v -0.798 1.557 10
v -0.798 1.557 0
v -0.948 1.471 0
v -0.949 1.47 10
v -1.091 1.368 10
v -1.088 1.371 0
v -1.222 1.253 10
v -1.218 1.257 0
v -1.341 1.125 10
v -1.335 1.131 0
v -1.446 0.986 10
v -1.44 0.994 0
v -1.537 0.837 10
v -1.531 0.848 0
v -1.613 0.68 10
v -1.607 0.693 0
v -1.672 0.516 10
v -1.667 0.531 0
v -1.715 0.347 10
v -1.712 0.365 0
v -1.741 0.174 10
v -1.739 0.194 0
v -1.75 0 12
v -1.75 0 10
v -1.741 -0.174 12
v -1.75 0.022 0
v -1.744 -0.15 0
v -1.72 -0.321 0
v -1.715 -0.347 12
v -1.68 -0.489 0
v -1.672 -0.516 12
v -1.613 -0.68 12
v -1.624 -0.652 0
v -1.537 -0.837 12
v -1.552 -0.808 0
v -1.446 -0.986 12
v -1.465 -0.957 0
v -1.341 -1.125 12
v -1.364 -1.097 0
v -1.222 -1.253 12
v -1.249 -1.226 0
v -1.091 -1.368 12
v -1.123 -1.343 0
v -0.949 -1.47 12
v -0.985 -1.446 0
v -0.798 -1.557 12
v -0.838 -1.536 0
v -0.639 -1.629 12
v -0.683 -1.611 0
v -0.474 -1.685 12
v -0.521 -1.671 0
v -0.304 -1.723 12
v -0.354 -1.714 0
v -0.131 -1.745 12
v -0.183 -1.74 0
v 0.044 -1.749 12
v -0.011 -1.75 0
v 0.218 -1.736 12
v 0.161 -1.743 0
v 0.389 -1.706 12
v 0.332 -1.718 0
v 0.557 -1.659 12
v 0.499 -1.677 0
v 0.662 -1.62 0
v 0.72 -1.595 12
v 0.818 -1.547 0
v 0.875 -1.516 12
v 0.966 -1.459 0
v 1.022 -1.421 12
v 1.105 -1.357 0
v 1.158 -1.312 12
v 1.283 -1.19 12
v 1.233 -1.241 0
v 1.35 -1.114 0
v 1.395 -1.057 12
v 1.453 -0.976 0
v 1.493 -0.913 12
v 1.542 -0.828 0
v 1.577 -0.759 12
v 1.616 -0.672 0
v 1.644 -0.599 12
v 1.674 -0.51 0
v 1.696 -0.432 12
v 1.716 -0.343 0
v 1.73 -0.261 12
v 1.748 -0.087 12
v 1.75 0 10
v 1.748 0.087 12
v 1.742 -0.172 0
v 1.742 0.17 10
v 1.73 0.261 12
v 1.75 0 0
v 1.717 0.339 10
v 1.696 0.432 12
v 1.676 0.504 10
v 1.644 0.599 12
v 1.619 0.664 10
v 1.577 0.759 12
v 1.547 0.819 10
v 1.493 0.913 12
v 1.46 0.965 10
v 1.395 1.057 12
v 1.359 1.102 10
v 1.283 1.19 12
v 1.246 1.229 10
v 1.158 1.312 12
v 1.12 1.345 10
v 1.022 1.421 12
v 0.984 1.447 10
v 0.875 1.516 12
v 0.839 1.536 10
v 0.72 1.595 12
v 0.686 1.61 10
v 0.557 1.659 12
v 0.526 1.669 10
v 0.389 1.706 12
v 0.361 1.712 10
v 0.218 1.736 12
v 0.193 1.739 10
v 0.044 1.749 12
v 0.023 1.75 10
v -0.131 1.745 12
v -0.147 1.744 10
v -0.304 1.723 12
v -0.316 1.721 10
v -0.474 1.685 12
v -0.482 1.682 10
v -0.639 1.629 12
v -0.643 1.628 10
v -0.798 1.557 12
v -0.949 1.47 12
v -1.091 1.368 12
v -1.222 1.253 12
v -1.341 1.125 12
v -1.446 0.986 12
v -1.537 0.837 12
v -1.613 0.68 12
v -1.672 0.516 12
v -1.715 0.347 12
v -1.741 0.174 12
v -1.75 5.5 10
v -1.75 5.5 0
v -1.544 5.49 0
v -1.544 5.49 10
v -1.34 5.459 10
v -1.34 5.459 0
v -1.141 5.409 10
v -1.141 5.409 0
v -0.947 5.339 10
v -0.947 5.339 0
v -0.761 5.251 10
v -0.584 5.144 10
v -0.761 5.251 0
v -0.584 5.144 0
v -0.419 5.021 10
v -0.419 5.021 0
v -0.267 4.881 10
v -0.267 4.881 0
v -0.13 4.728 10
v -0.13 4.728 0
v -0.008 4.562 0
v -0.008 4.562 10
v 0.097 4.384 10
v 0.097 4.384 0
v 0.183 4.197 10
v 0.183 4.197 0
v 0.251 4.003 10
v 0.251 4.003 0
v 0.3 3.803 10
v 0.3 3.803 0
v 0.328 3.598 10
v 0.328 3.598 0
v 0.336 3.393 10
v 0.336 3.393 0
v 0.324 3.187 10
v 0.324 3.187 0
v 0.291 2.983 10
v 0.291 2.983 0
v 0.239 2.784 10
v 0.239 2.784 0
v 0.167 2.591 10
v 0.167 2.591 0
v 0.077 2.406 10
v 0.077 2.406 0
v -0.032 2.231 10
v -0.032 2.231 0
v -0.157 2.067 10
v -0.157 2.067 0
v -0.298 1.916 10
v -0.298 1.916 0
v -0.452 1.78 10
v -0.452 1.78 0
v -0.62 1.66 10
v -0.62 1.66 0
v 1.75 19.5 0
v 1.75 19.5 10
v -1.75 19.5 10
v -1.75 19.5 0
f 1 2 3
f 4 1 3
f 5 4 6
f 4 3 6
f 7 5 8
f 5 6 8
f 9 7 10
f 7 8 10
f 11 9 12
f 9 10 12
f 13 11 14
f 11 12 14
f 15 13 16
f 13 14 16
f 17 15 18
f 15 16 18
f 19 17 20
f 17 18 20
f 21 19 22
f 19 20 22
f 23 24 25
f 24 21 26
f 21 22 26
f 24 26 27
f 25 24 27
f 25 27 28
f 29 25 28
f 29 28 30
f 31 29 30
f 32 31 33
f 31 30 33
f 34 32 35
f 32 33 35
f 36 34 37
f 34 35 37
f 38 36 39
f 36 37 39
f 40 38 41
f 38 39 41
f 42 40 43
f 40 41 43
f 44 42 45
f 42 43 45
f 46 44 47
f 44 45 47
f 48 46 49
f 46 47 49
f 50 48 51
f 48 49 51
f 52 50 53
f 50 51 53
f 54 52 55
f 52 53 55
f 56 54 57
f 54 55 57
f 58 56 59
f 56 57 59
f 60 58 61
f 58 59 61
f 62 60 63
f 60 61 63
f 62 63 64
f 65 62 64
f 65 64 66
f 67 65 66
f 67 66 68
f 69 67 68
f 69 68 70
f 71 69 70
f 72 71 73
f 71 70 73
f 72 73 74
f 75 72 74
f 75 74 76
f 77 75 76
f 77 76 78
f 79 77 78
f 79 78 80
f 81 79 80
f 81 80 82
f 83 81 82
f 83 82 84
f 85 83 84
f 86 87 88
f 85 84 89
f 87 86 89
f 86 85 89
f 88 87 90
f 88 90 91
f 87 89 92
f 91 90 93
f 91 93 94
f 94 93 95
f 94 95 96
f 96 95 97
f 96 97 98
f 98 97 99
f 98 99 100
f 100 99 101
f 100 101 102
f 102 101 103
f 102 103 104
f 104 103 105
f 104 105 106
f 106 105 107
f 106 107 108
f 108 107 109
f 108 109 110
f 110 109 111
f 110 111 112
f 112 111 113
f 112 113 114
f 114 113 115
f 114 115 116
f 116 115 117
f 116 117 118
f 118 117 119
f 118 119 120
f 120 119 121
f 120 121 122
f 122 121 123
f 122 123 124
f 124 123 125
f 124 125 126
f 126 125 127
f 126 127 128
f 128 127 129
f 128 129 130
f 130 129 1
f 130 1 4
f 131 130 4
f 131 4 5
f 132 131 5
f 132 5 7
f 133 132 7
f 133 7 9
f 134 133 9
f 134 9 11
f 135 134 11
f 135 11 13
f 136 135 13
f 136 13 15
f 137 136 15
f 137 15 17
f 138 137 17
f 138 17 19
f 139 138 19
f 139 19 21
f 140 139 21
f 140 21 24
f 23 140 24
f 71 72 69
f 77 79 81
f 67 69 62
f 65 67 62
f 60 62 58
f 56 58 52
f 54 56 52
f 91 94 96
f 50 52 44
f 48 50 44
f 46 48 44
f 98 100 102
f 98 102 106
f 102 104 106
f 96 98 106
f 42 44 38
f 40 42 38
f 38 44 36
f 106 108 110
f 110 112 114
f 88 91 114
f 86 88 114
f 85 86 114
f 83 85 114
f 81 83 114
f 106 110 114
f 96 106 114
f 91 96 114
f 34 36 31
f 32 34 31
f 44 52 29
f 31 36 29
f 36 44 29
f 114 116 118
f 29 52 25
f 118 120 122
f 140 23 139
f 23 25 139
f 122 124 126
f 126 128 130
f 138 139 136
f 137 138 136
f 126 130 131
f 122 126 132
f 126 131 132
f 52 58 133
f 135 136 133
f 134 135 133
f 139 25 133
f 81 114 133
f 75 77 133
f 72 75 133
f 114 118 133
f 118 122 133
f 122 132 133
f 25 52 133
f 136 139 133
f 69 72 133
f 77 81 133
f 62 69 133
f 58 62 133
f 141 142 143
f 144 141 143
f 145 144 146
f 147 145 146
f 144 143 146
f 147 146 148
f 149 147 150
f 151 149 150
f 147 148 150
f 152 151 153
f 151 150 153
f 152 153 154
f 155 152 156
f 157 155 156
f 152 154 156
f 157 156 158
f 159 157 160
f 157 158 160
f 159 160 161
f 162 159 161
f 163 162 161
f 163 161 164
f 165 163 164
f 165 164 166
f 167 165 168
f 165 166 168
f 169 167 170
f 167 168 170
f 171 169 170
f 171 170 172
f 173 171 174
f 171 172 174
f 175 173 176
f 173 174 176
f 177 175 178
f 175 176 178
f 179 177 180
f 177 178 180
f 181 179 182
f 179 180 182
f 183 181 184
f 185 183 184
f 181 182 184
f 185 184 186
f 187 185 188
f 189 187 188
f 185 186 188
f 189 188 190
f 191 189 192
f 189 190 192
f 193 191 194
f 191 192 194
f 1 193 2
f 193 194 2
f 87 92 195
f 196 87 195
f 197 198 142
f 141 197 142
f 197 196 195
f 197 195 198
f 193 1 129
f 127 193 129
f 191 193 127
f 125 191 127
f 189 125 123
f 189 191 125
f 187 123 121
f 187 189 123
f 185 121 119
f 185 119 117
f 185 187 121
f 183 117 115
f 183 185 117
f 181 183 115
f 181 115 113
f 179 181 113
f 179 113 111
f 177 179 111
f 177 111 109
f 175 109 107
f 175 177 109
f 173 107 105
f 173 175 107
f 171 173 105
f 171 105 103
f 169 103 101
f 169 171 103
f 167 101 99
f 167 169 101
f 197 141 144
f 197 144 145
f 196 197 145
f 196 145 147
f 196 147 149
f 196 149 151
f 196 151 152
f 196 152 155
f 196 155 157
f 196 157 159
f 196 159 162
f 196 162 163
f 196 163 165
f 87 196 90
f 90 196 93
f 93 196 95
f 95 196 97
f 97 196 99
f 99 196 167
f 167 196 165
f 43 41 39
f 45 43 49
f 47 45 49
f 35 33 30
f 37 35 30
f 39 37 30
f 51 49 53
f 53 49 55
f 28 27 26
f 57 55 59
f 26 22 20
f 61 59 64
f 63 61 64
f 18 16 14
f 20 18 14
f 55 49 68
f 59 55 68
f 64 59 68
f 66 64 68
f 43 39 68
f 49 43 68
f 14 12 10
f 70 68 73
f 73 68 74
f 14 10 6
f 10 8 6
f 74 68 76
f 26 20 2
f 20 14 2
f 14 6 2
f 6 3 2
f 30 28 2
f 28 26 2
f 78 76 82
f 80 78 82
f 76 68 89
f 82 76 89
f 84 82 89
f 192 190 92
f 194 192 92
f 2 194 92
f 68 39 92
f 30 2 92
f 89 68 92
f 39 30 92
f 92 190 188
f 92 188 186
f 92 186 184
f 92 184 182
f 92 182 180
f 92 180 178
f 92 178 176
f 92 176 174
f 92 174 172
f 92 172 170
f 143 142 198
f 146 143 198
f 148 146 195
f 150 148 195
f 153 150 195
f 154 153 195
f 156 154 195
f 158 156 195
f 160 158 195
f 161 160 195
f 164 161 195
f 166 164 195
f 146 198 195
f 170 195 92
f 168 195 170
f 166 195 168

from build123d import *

# Parameters (mm, degrees)
DODANIE_WYCI_GNI_CIE1_DEPTH = 10
SZKIC2_R                    = 1.75
DODANIE_WYCI_GNI_CIE2_DEPTH = 12


with BuildPart() as part:
    # Szkic1 → Dodanie-wyciągnięcie1 (new body)
    with BuildSketch(Plane.XY):
        with BuildLine():
            Line((1.75, 0), (1.75, 19.5))
            Line((1.75, 19.5), (-1.75, 19.5))
            Line((-1.75, 19.5), (-1.75, 5.5))
            ThreePointArc((-1.75, 5.5), (0.277964608, 3.903301802), (-0.798314607, 1.557303371))
            ThreePointArc((-0.798314607, 1.557303371), (-0.912537517, -1.493243209), (1.75, 0))
        make_face()
    extrude(amount=DODANIE_WYCI_GNI_CIE1_DEPTH)

    # Szkic2 → Dodanie-wyciągnięcie2 (add)
    with BuildSketch(Plane(origin=(0, 0, 0), x_dir=(-1, 0, 0), z_dir=(0, 0, -1))):
        Circle(SZKIC2_R)
    extrude(amount=-DODANIE_WYCI_GNI_CIE2_DEPTH)


solid = part.part
